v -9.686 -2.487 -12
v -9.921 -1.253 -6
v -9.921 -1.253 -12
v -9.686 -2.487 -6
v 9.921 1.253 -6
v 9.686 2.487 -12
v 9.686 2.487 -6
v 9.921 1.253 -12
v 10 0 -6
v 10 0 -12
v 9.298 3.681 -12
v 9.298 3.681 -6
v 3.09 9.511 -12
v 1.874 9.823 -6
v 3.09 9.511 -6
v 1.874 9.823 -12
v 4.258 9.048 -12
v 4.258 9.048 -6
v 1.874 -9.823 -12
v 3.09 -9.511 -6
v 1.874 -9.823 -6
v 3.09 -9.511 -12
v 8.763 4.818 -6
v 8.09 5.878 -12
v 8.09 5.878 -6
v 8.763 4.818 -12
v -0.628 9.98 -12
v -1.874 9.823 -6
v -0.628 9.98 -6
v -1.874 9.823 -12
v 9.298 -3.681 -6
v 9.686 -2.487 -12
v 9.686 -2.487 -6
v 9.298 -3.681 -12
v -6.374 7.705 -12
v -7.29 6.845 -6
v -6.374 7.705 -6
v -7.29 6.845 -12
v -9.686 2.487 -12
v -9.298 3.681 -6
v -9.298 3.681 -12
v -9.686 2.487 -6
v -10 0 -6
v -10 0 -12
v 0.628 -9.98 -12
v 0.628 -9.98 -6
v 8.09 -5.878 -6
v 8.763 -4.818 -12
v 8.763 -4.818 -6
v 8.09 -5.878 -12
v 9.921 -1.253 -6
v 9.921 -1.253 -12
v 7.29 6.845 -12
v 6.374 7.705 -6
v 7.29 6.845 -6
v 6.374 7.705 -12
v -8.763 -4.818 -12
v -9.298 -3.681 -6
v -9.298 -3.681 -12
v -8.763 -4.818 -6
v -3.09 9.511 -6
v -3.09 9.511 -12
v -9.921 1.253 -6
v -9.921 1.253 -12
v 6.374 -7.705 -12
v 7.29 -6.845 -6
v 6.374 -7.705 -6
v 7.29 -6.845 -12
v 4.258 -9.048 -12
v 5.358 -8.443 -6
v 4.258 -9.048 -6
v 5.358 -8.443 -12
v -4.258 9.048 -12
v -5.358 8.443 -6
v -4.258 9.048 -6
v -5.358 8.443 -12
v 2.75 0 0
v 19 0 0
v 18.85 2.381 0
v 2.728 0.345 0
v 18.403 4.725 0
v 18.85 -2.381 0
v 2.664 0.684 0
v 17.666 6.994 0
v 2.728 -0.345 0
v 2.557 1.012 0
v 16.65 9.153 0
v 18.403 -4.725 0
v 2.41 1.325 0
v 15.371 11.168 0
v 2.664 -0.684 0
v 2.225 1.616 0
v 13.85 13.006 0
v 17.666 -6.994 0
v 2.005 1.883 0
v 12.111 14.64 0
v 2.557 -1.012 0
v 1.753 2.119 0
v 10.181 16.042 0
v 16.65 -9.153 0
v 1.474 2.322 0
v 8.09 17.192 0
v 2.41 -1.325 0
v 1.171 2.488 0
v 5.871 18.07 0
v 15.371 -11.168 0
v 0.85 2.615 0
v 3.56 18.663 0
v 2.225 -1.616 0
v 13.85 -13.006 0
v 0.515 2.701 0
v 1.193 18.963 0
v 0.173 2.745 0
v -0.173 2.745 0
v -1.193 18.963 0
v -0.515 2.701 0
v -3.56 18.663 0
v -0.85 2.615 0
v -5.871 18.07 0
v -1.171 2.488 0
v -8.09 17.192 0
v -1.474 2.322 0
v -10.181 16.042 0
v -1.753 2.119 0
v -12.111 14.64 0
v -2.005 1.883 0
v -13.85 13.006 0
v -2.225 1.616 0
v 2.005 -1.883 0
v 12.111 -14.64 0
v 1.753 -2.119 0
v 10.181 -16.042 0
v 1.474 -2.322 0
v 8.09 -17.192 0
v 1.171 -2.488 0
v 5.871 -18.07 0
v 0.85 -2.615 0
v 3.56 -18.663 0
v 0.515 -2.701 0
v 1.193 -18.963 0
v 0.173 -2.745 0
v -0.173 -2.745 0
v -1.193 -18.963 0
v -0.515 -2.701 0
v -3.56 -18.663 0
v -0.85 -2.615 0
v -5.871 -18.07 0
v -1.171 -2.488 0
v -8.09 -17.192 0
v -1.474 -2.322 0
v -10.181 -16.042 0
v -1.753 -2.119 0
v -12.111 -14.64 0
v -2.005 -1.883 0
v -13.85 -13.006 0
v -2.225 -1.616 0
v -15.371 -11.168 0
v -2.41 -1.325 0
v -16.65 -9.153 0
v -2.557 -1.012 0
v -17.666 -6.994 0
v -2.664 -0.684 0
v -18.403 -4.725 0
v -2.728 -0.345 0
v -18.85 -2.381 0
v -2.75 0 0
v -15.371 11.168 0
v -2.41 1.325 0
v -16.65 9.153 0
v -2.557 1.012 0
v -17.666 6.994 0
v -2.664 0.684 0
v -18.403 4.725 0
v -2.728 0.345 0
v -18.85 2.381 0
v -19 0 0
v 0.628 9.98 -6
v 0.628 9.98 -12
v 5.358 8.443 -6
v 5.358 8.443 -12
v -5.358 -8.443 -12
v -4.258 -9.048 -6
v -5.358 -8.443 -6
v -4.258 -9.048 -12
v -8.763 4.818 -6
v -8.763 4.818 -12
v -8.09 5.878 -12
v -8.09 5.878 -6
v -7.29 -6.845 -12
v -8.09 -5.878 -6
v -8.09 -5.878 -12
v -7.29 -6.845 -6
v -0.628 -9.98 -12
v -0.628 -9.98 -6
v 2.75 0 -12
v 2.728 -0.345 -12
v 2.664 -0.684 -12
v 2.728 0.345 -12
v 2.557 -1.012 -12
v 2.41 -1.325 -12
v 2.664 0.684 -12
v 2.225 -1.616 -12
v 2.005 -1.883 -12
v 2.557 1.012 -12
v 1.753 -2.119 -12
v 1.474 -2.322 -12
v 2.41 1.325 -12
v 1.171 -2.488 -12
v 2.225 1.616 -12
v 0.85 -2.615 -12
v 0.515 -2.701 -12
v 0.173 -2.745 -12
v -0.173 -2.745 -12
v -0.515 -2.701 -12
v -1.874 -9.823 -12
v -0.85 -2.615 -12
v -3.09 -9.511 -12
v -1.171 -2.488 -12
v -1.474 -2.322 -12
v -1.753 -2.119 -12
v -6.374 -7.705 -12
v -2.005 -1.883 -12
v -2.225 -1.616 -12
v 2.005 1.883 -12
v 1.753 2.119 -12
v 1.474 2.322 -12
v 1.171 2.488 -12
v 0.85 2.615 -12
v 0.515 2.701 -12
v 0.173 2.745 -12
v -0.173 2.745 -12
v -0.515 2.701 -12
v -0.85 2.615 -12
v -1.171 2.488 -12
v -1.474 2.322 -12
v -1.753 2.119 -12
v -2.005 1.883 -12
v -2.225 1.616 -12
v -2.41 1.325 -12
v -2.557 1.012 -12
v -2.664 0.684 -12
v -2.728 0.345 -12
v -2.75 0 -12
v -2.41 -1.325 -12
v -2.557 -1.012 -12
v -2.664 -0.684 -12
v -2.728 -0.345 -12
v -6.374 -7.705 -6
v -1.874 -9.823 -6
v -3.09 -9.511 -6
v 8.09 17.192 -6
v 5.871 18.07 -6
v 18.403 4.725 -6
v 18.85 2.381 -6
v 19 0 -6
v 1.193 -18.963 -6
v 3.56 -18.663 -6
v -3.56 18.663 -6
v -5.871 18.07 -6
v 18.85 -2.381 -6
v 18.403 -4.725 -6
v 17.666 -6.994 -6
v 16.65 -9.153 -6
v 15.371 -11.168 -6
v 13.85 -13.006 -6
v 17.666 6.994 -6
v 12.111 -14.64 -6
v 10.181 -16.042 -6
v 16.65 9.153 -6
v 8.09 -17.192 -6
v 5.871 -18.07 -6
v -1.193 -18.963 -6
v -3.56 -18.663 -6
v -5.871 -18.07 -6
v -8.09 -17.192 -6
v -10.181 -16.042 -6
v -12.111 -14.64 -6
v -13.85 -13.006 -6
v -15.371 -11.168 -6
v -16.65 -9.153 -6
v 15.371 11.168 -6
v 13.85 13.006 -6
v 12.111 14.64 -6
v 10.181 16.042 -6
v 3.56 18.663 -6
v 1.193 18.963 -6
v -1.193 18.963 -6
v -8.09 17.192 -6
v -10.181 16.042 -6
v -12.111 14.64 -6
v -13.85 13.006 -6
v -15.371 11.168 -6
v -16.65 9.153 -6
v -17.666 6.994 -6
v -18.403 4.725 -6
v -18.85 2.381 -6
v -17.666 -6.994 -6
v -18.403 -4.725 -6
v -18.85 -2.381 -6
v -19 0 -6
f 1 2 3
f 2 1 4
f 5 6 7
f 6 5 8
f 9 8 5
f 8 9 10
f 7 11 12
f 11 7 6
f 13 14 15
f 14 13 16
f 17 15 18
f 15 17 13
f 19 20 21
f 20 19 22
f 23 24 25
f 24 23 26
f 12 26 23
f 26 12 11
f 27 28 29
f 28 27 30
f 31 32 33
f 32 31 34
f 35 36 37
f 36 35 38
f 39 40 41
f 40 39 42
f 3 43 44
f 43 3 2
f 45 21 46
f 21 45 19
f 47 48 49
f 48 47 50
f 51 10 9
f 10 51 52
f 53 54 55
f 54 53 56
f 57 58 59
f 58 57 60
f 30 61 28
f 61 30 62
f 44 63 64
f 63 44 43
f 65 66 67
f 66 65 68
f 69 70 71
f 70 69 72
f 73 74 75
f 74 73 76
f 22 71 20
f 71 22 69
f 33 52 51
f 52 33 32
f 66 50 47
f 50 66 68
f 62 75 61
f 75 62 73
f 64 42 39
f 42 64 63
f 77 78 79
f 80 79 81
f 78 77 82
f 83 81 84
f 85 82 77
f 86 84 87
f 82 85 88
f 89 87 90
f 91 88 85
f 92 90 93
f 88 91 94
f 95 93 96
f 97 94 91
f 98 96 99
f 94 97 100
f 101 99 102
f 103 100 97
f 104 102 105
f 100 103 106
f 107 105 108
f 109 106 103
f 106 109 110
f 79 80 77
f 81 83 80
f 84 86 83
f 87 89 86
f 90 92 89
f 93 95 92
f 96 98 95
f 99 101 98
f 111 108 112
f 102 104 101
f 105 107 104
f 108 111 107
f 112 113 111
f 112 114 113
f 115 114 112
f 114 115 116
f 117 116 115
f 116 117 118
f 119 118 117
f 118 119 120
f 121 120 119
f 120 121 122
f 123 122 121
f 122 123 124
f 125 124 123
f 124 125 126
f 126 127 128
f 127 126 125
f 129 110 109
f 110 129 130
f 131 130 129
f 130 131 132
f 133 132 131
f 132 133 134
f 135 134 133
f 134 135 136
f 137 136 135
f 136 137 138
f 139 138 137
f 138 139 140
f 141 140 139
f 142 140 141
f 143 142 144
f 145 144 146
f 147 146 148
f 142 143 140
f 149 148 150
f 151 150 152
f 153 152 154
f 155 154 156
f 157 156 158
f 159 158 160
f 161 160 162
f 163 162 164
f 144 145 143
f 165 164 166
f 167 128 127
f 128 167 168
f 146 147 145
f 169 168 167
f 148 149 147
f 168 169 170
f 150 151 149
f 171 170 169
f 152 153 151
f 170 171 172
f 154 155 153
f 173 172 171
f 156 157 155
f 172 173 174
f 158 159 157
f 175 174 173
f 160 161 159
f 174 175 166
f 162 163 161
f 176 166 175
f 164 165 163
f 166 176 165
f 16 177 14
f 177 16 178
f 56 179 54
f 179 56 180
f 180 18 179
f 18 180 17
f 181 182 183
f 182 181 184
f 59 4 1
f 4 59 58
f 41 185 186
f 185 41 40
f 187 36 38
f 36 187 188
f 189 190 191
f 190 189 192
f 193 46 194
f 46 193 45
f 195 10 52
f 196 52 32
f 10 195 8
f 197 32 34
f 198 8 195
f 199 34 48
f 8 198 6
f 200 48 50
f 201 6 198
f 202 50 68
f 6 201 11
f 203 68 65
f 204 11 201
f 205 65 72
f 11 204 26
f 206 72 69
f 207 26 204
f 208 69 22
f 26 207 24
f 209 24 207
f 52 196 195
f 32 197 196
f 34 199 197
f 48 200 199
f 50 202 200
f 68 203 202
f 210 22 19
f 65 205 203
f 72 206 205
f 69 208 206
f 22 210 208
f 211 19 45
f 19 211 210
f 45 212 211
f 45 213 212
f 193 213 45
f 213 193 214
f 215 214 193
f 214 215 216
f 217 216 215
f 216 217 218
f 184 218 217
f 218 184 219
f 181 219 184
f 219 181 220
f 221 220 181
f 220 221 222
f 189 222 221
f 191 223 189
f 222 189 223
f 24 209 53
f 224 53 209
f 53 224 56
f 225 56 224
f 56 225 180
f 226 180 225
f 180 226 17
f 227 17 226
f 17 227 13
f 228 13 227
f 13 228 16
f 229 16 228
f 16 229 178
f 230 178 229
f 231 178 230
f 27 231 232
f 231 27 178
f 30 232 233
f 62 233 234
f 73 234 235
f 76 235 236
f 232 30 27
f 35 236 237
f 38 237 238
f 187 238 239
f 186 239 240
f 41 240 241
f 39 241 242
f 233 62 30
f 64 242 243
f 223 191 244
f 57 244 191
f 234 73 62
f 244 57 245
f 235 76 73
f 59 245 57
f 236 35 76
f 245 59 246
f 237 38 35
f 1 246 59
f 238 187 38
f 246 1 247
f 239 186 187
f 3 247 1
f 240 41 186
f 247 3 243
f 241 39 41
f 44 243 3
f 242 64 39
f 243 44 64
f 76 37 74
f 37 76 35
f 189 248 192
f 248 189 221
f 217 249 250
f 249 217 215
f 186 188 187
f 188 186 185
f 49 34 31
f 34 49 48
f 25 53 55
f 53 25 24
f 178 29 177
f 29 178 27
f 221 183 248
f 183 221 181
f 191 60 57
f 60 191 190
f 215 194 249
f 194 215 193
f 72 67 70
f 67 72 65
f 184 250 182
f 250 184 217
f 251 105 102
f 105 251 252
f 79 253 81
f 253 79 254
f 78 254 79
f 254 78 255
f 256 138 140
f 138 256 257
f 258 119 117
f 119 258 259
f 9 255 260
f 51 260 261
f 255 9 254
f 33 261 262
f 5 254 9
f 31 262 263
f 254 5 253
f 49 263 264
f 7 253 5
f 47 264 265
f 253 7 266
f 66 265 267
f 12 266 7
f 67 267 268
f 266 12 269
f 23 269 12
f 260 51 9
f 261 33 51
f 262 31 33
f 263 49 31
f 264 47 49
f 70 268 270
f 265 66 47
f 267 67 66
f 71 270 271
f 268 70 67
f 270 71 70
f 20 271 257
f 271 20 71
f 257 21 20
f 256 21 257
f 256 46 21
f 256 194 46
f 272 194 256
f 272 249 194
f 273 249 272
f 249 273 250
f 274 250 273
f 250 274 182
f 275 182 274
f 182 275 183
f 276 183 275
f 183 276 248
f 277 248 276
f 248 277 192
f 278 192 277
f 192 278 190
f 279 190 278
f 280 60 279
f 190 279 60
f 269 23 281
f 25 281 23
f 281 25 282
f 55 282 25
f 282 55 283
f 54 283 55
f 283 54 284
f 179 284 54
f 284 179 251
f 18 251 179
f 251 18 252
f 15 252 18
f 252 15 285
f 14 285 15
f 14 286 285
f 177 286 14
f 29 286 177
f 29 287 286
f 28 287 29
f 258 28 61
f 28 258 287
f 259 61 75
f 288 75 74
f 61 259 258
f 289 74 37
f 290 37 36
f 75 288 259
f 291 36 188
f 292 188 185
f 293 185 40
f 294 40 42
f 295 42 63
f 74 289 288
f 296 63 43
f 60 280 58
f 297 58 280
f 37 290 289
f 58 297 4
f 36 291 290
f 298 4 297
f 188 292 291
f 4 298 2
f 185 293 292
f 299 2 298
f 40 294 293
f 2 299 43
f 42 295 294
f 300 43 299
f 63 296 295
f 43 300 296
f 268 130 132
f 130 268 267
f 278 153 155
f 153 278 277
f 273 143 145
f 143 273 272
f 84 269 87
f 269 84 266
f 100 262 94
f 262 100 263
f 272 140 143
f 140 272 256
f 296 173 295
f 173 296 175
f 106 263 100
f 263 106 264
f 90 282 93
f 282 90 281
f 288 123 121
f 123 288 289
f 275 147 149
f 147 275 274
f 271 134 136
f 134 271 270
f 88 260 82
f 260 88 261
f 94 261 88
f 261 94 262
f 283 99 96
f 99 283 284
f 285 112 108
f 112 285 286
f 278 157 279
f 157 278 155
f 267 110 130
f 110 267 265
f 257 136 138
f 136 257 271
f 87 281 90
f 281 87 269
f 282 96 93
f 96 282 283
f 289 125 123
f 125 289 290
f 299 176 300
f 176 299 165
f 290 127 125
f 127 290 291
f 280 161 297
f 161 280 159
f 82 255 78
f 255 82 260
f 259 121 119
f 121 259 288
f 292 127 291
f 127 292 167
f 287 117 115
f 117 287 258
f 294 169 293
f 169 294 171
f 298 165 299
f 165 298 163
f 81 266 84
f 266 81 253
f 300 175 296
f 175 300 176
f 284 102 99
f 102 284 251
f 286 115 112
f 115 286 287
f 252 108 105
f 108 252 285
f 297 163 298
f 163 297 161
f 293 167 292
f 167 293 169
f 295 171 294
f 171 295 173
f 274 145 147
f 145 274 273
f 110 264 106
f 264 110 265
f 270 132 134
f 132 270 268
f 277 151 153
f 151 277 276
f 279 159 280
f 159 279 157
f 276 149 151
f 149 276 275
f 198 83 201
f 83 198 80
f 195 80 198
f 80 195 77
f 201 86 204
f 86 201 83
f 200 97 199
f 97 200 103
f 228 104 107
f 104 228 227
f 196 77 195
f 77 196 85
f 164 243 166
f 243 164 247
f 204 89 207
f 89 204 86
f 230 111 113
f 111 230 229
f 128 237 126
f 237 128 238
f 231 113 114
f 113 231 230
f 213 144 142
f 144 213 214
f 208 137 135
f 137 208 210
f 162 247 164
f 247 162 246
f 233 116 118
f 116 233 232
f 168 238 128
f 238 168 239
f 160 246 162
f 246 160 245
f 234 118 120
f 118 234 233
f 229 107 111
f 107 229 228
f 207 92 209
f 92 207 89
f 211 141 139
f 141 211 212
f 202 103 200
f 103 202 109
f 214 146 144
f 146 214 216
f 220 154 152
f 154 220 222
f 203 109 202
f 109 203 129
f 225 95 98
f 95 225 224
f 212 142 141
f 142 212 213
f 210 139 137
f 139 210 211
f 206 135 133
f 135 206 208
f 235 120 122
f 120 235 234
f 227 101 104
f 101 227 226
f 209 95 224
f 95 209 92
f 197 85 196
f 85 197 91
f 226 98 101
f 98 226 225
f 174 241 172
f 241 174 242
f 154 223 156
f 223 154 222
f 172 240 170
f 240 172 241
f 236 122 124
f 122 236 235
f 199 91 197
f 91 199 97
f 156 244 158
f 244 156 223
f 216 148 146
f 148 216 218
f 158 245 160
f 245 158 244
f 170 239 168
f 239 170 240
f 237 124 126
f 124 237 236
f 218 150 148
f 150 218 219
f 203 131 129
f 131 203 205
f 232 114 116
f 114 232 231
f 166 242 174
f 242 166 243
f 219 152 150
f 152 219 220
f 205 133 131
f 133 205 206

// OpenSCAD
$fn = 50;


difference() {
	union() {
		translate(v = [0, 0, -12.0000000000]) {
			cylinder(h = 12, r = 10.0000000000);
		}
		translate(v = [0, 0, -6.0000000000]) {
			cylinder(h = 6, r = 19.0000000000);
		}
	}
	union() {
		#translate(v = [0, 0, -12]) {
			cylinder(h = 12, r = 2.7500000000);
		}
	}
}
